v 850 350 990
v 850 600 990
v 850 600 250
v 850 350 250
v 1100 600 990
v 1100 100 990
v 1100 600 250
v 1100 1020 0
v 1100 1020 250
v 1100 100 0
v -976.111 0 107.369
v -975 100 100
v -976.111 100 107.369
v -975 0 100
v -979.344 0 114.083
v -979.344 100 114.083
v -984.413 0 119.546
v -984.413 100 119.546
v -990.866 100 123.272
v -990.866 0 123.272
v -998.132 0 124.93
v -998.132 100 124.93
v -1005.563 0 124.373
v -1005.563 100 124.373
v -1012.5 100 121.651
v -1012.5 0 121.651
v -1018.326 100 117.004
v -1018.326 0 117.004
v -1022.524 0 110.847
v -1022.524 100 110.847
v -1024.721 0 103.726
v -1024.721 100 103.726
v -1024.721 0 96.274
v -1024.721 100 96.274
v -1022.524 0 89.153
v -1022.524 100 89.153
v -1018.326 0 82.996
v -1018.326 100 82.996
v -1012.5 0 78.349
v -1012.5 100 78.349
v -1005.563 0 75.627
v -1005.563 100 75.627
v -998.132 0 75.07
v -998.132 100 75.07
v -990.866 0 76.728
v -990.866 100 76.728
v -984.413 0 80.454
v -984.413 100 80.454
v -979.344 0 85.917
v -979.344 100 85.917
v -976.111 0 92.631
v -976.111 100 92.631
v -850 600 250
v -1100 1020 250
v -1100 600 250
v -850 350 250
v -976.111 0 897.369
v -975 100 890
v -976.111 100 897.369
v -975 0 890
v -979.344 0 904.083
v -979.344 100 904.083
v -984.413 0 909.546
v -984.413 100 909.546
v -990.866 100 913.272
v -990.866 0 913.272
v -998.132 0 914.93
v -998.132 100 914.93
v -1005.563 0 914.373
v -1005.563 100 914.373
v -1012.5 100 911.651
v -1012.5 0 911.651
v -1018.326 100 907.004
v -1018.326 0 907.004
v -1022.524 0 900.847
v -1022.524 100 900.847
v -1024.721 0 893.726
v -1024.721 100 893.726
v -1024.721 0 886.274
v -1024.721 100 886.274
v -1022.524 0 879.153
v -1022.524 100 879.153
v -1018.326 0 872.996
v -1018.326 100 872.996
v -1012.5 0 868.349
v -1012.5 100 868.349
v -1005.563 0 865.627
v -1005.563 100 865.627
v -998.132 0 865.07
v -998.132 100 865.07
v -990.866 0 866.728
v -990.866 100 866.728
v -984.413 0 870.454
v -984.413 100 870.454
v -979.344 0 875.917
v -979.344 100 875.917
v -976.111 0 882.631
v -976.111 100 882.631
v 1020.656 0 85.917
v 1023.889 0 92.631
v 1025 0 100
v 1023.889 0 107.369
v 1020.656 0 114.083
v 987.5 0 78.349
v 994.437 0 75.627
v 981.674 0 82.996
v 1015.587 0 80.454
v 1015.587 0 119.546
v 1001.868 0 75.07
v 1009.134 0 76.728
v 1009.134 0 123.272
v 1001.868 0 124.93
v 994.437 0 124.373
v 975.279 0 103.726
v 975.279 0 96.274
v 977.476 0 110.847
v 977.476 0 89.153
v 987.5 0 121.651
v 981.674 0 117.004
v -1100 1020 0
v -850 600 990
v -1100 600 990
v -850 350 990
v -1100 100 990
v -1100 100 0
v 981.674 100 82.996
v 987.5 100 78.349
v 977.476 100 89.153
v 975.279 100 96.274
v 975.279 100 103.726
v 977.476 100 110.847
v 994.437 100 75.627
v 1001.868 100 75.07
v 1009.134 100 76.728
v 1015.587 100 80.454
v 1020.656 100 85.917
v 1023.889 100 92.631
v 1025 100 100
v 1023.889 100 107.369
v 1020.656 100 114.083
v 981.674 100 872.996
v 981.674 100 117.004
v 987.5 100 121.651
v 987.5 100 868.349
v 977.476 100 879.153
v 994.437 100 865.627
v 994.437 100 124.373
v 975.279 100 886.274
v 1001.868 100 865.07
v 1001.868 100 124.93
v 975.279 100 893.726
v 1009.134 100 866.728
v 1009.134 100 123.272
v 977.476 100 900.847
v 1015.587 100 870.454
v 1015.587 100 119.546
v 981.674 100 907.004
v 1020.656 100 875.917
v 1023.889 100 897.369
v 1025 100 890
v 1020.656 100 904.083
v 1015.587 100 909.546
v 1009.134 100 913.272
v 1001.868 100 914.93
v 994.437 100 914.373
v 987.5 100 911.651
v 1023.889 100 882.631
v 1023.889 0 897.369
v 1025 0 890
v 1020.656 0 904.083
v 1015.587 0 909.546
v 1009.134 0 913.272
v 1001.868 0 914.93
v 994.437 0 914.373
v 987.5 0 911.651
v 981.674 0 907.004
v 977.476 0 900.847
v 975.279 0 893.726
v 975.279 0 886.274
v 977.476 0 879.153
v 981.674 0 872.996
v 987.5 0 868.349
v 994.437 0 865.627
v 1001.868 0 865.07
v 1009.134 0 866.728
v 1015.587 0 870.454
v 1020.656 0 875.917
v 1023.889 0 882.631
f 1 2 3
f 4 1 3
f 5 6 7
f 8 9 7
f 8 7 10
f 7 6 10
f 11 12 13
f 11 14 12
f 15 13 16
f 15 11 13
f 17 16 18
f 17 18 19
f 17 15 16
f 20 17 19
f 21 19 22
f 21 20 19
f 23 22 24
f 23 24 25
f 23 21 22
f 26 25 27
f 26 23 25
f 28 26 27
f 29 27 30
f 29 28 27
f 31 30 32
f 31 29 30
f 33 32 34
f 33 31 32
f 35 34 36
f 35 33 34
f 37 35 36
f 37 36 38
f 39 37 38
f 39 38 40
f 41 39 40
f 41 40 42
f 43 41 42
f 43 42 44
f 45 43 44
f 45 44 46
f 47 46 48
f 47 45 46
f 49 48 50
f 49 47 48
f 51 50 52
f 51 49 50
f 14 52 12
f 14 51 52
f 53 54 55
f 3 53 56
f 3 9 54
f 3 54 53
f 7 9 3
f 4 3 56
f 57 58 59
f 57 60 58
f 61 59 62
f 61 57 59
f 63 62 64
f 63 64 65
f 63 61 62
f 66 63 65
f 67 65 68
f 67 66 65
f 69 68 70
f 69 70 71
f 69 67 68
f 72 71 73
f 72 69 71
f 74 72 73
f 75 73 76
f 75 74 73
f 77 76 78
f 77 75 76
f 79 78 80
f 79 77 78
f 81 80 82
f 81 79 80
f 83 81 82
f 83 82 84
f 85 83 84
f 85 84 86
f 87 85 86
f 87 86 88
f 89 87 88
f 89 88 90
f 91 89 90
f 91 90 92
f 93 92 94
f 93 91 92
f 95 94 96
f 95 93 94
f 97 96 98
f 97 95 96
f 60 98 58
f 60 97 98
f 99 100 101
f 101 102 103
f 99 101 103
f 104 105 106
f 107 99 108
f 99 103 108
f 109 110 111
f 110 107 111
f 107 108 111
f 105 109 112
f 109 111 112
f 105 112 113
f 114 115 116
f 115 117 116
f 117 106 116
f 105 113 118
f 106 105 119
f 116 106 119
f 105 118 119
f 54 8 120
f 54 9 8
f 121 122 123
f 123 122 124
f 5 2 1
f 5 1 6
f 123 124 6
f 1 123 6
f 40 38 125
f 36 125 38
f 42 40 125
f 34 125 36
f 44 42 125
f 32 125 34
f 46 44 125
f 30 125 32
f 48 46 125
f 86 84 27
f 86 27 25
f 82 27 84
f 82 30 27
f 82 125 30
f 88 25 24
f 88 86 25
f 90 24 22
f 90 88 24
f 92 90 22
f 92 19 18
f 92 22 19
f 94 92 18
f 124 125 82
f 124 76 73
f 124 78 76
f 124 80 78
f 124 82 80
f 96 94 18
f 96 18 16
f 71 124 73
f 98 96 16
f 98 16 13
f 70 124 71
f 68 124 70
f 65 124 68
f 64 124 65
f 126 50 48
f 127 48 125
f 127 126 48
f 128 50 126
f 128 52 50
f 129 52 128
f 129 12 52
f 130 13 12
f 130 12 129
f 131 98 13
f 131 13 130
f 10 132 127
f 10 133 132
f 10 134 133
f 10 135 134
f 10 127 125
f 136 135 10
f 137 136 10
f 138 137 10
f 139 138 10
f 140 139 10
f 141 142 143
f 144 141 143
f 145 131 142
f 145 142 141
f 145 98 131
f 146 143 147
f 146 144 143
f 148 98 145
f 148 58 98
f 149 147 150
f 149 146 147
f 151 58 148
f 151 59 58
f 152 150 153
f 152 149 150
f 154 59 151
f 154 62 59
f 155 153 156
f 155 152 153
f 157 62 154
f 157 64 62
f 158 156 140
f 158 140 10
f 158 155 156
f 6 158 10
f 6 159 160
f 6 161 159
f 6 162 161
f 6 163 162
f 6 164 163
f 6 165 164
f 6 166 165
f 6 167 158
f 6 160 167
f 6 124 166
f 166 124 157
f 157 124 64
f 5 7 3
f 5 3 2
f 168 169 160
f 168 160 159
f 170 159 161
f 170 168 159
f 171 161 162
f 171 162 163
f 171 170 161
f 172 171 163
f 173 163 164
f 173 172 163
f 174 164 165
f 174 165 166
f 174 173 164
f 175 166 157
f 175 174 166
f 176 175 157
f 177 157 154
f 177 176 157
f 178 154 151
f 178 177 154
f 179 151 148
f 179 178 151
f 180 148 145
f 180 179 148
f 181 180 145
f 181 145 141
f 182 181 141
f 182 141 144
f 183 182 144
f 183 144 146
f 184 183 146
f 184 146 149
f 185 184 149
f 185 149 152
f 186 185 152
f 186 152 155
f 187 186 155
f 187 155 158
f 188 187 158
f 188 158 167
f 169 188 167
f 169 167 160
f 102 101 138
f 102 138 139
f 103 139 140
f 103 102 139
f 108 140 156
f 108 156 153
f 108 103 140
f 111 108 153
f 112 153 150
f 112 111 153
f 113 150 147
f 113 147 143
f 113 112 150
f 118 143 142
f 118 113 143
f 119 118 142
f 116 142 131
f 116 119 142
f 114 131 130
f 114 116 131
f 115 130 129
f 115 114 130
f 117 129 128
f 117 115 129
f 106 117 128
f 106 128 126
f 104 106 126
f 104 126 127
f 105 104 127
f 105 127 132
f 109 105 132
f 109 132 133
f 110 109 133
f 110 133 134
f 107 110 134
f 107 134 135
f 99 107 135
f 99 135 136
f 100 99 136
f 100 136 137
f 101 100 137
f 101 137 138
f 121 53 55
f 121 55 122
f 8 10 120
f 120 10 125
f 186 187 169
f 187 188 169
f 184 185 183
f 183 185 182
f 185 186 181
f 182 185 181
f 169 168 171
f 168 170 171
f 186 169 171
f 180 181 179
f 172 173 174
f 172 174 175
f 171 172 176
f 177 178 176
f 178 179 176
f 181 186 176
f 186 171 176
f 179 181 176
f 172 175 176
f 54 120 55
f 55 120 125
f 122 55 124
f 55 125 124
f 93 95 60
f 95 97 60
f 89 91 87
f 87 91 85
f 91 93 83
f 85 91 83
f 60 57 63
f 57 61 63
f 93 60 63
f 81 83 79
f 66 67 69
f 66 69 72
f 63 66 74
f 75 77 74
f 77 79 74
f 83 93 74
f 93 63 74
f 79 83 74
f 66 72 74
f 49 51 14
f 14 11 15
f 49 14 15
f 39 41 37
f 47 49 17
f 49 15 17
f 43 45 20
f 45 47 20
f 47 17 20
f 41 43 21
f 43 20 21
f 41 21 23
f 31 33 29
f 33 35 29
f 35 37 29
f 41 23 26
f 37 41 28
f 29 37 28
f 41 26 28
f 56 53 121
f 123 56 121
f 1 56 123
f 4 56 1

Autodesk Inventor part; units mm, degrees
ref_plane "YZ Plane" through (0, 0, 0) normal (1, 0, 0) x (0, 1, 0)
ref_plane "XZ Plane" through (0, 0, 0) normal (0, 1, 0) x (-1, 0, 0)
ref_plane "XY Plane" through (0, 0, 0) normal (0, 0, 1) x (1, 0, 0)
sketch "Sketch1" plane through (0, 0, 0) normal (0, 1, 0) x (-1, 0, 0)
  line L0 (1100, 990) -> (-1100, 990)
  line L1 (-1100, 990) -> (-1100, 0)
  line L2 (-1100, 0) -> (1100, 0)
  line L3 (1100, 0) -> (1100, 990)
  point P0 (0, 0)
  point P1 (0, 0)
  dimension "d0" = 2200
  dimension "d1" = 990
extrude "Extrusion1" add sketch "Sketch1" along normal blind 1020
sketch "Sketch2" plane through (1100, 0, 990) normal (1, 0, 0) x (0, 0, -1)
  line L0 (0, 0) -> (0, 1020) projected
  line L1 (0, 1020) -> (740, 1020)
  line L2 (740, 1020) -> (740, 600)
  line L3 (740, 600) -> (0, 600)
  line L4 (0, 600) -> (0, 1020)
  line L5 (990, 0) -> (990, 1020) projected
  point P0 (0, 600)
  dimension "d4" = 600
  dimension "d5" = 250
extrude "Extrusion2" cut sketch "Sketch2" against normal through all
sketch "Sketch3" plane through (1100, 600, 990) normal (0, 1, 0) x (1, 0, 0)
  line L0 (-2200, 0) -> (0, 0) projected
  line L1 (-2200, 740) -> (0, 740) projected
  line L2 (-1950, 0) -> (-250, 0)
  line L3 (-250, 0) -> (-250, 740)
  line L4 (-250, 740) -> (-1950, 740)
  line L5 (-1950, 740) -> (-1950, 0)
  line L6 (-2200, 0) -> (-2200, 740) projected
  point P0 (-1100, 990)
  point P1 (-1100, 0)
  point P2 (-1100, 0)
  point P3 (-1950, 740)
  point P4 (-250, 0)
  dimension "d8" = 250
extrude "Extrusion3" cut sketch "Sketch3" against normal blind 250 contours L5 L1 L3 L0
sketch "Sketch4" plane through (0, 0, 0) normal (0, -1, 0) x (1, 0, 0)
  line L0 (1100, 990) -> (1100, 0) projected
  line L1 (-1100, 990) -> (1100, 990) projected
  line L2 (-1100, 0) -> (-1100, 990) projected
  line L3 (1100, 0) -> (-1100, 0) projected
  line L4 (1000, 890) -> (1000, 100) construction
  line L5 (1000, 100) -> (-1000, 100) construction
  line L6 (-1000, 100) -> (-1000, 890) construction
  line L7 (-1000, 890) -> (1000, 890) construction
  circle A0 centre (-1000, 890) radius 25
  circle A1 centre (1000, 890) radius 25
  circle A2 centre (1000, 100) radius 25
  circle A3 centre (-1000, 100) radius 25
  point P0 (0, 0)
  dimension "d11" = 100
  dimension "d12" = 50
  dimension "d13" = 50
  dimension "d14" = 50
  dimension "d15" = 50
extrude "Extrusion4" cut sketch "Sketch4" against normal blind 100
properties part number "Divano Valdinoce"
